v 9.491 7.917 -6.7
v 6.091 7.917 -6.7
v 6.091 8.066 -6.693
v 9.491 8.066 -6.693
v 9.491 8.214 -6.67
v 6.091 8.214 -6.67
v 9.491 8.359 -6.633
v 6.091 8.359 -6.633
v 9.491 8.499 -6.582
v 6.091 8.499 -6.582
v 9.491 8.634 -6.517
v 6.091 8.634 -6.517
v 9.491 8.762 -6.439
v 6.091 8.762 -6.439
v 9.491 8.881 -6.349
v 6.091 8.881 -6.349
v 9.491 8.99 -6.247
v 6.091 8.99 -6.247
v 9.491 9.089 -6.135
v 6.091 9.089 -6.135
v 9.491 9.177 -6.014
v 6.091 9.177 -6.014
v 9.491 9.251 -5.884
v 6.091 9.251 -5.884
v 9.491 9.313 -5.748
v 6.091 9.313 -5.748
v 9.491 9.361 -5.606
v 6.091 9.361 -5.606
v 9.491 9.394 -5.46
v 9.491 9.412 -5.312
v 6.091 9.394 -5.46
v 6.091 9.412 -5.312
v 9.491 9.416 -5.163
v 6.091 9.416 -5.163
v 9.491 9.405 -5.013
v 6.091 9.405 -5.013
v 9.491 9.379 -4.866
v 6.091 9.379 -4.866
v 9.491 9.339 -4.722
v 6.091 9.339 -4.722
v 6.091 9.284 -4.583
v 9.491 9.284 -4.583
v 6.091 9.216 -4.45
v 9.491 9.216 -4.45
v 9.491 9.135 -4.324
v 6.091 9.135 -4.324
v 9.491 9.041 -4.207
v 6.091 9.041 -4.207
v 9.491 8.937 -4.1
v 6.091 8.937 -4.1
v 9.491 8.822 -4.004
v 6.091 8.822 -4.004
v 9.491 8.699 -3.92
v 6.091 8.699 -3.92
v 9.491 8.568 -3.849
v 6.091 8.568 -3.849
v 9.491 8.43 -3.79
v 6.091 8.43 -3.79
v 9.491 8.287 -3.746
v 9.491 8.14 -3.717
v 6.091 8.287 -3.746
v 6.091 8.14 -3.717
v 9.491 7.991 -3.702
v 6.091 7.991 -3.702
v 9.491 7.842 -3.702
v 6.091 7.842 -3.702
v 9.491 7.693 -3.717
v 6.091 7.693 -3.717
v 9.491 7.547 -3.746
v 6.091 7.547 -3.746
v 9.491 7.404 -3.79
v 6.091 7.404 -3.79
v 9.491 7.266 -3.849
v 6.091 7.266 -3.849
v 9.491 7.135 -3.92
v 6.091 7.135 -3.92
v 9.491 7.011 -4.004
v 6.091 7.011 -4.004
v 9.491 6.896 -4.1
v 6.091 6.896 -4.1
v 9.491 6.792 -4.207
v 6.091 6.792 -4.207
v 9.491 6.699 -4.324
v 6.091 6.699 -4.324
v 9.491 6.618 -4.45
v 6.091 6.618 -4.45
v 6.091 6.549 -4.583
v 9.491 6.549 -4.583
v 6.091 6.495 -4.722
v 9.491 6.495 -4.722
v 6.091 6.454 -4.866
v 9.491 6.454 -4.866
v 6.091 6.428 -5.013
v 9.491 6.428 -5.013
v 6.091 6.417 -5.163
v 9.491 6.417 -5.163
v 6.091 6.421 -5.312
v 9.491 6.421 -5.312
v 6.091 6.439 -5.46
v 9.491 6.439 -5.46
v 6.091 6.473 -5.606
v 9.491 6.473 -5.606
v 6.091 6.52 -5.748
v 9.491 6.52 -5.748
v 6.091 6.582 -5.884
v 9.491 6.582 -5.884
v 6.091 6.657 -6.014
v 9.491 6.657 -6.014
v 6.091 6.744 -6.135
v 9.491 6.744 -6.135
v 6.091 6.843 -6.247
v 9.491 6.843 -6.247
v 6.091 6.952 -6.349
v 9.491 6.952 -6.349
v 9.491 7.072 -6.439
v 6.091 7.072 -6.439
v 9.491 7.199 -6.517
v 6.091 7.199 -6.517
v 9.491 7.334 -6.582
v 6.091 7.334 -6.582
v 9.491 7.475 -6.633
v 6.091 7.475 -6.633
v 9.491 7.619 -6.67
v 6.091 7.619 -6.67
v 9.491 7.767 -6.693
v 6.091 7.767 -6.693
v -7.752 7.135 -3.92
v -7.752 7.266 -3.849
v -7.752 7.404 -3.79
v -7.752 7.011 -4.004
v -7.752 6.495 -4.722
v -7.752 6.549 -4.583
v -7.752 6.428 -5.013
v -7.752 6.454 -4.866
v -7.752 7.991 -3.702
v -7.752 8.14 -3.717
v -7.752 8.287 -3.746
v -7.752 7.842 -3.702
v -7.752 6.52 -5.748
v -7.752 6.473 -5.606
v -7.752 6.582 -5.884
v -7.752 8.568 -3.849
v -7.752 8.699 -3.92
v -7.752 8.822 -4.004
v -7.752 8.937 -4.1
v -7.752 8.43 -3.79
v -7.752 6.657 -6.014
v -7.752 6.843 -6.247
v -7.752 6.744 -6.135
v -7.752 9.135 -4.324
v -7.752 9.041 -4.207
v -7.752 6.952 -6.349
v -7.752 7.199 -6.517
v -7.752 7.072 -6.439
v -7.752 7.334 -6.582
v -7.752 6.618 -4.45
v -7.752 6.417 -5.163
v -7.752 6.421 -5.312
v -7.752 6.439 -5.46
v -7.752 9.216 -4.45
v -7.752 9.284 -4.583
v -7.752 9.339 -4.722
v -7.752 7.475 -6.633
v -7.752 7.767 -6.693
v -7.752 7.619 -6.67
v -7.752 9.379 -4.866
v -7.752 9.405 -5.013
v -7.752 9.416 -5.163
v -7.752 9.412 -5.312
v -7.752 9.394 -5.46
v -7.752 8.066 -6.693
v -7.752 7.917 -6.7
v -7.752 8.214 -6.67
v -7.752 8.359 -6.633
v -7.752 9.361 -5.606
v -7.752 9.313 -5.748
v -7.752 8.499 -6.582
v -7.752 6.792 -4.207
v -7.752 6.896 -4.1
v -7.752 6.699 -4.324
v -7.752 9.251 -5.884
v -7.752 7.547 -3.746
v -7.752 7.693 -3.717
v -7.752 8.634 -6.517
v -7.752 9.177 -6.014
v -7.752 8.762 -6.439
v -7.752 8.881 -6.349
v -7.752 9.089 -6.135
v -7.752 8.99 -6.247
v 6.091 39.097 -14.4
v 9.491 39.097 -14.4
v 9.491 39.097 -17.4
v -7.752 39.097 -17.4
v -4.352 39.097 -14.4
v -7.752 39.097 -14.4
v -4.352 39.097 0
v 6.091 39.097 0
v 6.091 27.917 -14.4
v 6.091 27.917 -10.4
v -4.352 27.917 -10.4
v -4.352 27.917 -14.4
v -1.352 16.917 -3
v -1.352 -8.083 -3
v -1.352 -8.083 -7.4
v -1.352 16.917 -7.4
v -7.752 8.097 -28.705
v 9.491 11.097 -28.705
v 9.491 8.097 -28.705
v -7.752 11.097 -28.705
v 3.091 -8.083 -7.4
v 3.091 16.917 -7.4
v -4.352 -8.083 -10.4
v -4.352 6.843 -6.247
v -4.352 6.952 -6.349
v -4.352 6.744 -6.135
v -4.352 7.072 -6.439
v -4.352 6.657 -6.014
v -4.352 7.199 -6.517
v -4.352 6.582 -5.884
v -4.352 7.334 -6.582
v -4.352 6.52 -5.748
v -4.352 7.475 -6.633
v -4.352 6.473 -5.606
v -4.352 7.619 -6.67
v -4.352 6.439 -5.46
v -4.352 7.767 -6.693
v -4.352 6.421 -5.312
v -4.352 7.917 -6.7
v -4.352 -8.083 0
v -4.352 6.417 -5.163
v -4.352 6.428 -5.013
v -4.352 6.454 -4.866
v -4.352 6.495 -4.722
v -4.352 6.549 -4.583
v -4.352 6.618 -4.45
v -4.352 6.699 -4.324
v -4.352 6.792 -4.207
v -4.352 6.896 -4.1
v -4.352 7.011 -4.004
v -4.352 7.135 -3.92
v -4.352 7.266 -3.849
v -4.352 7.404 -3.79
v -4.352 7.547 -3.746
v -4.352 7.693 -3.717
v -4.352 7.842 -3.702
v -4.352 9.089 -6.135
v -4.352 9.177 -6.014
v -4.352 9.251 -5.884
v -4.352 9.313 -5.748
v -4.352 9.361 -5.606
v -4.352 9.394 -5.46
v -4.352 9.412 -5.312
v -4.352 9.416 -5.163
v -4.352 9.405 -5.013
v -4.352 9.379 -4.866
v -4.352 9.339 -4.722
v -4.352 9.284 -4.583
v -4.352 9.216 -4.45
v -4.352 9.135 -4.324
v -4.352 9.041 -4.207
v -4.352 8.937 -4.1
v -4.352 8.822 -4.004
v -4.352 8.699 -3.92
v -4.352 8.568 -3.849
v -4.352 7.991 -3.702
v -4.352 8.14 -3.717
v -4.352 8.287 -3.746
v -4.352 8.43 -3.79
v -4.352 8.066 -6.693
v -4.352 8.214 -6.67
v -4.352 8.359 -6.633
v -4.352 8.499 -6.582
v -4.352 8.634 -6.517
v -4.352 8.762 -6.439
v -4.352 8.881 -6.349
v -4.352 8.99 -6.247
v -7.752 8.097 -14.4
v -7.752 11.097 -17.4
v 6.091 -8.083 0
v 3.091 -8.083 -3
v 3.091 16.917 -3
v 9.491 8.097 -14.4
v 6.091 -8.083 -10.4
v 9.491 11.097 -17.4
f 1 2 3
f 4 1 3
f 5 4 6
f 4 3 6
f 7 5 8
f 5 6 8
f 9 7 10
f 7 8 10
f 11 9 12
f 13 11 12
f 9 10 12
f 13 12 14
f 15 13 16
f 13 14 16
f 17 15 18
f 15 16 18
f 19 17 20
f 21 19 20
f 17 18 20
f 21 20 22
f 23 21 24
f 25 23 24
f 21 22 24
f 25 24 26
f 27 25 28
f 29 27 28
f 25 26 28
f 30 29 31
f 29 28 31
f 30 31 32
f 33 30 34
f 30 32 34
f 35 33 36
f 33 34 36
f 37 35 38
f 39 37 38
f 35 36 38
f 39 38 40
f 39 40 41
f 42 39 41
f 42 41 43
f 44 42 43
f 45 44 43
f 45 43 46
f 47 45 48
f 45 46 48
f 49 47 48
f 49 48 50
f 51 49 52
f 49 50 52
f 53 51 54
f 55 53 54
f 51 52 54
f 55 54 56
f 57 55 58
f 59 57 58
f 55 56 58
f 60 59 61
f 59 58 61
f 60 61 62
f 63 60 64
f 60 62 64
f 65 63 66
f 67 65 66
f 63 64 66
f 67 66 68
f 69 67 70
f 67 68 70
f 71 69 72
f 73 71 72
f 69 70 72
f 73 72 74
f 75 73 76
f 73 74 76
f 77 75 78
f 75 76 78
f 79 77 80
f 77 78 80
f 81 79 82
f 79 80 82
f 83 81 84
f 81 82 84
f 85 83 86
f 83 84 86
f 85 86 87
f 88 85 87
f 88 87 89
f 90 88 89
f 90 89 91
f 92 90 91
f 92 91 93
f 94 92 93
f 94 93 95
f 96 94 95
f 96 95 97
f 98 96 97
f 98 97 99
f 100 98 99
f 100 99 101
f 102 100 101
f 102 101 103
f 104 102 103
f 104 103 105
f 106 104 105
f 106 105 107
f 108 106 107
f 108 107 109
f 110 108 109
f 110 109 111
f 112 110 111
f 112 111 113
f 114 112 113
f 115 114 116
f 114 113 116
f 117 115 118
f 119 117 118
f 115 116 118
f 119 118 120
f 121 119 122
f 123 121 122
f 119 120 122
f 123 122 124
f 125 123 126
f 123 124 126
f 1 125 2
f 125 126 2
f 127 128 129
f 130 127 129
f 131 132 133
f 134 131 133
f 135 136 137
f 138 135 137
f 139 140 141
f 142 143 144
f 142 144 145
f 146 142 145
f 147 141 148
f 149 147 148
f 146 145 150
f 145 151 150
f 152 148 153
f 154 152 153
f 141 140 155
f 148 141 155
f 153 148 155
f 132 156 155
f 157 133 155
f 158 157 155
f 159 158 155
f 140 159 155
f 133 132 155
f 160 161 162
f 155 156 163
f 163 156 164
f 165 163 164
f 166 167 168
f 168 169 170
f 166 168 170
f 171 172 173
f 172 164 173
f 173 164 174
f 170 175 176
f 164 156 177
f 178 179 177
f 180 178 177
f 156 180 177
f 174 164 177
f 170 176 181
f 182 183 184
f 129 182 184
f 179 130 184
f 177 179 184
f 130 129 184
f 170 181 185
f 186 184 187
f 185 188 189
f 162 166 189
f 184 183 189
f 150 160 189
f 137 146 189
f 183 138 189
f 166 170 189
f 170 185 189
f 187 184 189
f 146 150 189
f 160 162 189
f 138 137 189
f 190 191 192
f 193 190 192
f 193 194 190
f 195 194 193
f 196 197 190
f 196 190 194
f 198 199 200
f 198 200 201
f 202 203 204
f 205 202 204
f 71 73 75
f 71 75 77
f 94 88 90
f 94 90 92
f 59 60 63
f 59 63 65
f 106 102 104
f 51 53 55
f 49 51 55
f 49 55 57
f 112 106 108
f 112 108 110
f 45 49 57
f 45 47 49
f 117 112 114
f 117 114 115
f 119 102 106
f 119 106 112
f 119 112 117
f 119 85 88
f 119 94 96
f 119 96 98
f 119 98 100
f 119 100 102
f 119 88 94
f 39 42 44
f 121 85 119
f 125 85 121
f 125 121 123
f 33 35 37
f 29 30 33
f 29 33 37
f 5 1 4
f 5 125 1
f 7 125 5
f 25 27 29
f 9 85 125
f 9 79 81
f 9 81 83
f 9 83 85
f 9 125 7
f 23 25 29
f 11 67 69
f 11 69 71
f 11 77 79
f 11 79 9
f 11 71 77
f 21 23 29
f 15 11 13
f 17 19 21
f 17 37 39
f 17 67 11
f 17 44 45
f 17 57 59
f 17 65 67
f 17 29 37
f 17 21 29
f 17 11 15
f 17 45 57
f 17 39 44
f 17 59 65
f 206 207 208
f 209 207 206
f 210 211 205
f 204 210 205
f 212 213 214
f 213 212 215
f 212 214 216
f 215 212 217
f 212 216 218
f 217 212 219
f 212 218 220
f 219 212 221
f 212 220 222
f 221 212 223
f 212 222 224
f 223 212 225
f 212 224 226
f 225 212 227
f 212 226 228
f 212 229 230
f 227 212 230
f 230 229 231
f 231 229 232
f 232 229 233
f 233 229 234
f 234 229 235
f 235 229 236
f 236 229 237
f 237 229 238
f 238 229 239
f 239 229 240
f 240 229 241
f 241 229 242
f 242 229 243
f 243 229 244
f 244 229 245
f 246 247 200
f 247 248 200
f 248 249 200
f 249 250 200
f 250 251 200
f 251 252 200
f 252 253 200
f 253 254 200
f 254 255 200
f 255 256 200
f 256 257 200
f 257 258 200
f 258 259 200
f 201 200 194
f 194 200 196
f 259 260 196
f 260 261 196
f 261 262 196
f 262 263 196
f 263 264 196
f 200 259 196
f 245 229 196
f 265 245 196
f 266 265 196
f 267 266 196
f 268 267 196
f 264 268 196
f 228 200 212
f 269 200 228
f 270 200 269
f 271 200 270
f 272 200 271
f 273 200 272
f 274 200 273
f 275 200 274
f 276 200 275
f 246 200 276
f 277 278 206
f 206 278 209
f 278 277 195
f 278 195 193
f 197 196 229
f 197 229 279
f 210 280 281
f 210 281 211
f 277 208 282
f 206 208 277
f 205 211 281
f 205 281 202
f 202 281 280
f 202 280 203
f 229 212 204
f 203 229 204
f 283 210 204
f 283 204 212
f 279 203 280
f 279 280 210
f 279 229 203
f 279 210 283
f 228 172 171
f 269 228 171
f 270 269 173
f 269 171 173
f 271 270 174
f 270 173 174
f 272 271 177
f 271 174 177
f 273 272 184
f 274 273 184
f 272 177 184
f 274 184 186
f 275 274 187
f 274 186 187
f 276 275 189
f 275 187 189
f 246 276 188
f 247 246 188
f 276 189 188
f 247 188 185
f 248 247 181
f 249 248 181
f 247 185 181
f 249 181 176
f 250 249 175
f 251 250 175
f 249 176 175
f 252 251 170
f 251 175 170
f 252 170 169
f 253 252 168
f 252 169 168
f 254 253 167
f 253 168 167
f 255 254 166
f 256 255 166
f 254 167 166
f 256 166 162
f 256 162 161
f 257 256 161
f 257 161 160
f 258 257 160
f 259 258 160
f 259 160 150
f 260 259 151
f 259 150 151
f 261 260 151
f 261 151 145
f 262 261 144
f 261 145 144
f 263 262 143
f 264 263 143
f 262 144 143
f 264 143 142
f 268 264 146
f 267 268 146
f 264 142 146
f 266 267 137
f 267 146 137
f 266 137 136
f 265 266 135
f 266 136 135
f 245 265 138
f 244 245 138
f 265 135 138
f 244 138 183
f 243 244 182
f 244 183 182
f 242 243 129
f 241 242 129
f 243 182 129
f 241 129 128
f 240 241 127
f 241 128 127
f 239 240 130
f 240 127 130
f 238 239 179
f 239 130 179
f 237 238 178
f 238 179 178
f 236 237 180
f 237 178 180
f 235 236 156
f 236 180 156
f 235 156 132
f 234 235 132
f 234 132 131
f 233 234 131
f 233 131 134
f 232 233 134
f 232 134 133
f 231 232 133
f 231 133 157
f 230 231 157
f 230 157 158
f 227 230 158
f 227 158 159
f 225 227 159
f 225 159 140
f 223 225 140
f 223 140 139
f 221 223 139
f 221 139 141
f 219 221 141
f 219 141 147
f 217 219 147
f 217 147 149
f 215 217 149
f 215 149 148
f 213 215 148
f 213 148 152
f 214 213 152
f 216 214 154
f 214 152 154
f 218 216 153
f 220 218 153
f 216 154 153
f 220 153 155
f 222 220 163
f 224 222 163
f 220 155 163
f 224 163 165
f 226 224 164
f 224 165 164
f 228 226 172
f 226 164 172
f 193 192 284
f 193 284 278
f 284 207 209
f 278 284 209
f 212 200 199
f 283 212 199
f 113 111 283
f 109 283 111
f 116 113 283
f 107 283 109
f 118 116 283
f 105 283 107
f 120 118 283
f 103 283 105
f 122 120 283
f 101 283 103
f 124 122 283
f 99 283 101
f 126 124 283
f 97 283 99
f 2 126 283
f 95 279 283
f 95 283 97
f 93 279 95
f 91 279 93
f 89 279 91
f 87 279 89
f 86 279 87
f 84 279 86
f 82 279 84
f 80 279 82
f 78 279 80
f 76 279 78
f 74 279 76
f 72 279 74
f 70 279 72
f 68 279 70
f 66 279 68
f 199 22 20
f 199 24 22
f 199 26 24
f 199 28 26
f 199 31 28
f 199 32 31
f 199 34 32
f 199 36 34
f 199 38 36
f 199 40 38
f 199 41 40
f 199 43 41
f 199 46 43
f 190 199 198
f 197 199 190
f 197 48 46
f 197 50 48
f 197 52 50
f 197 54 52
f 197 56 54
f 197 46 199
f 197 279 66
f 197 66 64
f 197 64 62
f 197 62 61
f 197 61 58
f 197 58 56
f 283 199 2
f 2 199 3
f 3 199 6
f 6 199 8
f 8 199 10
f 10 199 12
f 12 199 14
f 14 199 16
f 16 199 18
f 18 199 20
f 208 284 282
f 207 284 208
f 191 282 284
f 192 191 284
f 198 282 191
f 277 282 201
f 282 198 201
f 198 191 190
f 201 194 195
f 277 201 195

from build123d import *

# Parameters (mm, degrees)
SKETCH1_W           = 10.442861366
SKETCH1_H           = 47.180745659
BOSS_EXTRUDE1_DEPTH = 10.4
SKETCH2_W           = 4.442861366
SKETCH2_H           = 4.4
CUT_EXTRUDE1_DEPTH  = 25
WRAP1_START         = 6.090842934
WRAP1_OUTLINE_R     = 1.5
WRAP1_DEPTH         = 3.4
WRAP2_START         = -7.752018432
WRAP2_OUTLINE_R     = 1.5
WRAP2_DEPTH         = 3.4
SKETCH9_W           = 14.4
SKETCH9_H           = 11.180745659
BOSS_EXTRUDE2_DEPTH = 10.442861366
SKETCH10_W          = 17.242861366
SKETCH10_H          = 28
BOSS_EXTRUDE3_DEPTH = 3
SKETCH11_W          = 17.242861366
SKETCH11_H          = 14.30503792
BOSS_EXTRUDE4_DEPTH = 3


# Read off the part's stored shape, not the designer's step: Wrap1, Wrap2
with BuildPart() as part:
    # Sketch1 → Boss-Extrude1 (new body)
    with BuildSketch(Plane.XY):
        with Locations((0.869412251, 15.507053004)):
            Rectangle(SKETCH1_W, SKETCH1_H)
    extrude(amount=-BOSS_EXTRUDE1_DEPTH)

    # Sketch2 → Cut-Extrude1 (cut)
    with BuildSketch(Plane(origin=(0, -8.083319826, 0), x_dir=(-1, 0, 0), z_dir=(0, -1, 0))):
        with Locations((-0.869412251, 5.2)):
            Rectangle(SKETCH2_W, SKETCH2_H)
    extrude(amount=-CUT_EXTRUDE1_DEPTH, mode=Mode.SUBTRACT)

    # Wrap1 outline → Wrap1 (add)
    with BuildSketch(Plane(origin=(0, 0, 0), x_dir=(0, 0, -1), z_dir=(1, 0, 0)).offset(WRAP1_START)):
        with Locations((5.2, 7.916680174)):
            Circle(WRAP1_OUTLINE_R)
    extrude(amount=WRAP1_DEPTH)

    # Wrap2 outline → Wrap2 (add)
    with BuildSketch(Plane(origin=(0, 0, 0), x_dir=(0, 0, -1), z_dir=(1, 0, 0)).offset(WRAP2_START)):
        with Locations((5.2, 7.916680174)):
            Circle(WRAP2_OUTLINE_R)
    extrude(amount=WRAP2_DEPTH)

    # Sketch9 → Boss-Extrude2 (add)
    with BuildSketch(Plane(origin=(6.090842934, 0, 0), x_dir=(0, 0, -1), z_dir=(1, 0, 0))):
        with Locations((7.2, 33.507053004)):
            Rectangle(SKETCH9_W, SKETCH9_H)
    extrude(amount=-BOSS_EXTRUDE2_DEPTH)

    # Sketch10 → Boss-Extrude3 (add)
    with BuildSketch(Plane(origin=(0, 0, -14.4), x_dir=(-1, 0, 0), z_dir=(0, 0, -1))):
        with Locations((-0.869412251, 25.097425833)):
            Rectangle(SKETCH10_W, SKETCH10_H)
    extrude(amount=BOSS_EXTRUDE3_DEPTH)

    # Sketch11 → Boss-Extrude4 (add)
    with BuildSketch(Plane(origin=(0, 11.097425833, 0), x_dir=(-1, 0, 0), z_dir=(0, -1, 0))):
        with Locations((-0.869412251, 21.55251896)):
            Rectangle(SKETCH11_W, SKETCH11_H)
    extrude(amount=BOSS_EXTRUDE4_DEPTH)


solid = part.part
